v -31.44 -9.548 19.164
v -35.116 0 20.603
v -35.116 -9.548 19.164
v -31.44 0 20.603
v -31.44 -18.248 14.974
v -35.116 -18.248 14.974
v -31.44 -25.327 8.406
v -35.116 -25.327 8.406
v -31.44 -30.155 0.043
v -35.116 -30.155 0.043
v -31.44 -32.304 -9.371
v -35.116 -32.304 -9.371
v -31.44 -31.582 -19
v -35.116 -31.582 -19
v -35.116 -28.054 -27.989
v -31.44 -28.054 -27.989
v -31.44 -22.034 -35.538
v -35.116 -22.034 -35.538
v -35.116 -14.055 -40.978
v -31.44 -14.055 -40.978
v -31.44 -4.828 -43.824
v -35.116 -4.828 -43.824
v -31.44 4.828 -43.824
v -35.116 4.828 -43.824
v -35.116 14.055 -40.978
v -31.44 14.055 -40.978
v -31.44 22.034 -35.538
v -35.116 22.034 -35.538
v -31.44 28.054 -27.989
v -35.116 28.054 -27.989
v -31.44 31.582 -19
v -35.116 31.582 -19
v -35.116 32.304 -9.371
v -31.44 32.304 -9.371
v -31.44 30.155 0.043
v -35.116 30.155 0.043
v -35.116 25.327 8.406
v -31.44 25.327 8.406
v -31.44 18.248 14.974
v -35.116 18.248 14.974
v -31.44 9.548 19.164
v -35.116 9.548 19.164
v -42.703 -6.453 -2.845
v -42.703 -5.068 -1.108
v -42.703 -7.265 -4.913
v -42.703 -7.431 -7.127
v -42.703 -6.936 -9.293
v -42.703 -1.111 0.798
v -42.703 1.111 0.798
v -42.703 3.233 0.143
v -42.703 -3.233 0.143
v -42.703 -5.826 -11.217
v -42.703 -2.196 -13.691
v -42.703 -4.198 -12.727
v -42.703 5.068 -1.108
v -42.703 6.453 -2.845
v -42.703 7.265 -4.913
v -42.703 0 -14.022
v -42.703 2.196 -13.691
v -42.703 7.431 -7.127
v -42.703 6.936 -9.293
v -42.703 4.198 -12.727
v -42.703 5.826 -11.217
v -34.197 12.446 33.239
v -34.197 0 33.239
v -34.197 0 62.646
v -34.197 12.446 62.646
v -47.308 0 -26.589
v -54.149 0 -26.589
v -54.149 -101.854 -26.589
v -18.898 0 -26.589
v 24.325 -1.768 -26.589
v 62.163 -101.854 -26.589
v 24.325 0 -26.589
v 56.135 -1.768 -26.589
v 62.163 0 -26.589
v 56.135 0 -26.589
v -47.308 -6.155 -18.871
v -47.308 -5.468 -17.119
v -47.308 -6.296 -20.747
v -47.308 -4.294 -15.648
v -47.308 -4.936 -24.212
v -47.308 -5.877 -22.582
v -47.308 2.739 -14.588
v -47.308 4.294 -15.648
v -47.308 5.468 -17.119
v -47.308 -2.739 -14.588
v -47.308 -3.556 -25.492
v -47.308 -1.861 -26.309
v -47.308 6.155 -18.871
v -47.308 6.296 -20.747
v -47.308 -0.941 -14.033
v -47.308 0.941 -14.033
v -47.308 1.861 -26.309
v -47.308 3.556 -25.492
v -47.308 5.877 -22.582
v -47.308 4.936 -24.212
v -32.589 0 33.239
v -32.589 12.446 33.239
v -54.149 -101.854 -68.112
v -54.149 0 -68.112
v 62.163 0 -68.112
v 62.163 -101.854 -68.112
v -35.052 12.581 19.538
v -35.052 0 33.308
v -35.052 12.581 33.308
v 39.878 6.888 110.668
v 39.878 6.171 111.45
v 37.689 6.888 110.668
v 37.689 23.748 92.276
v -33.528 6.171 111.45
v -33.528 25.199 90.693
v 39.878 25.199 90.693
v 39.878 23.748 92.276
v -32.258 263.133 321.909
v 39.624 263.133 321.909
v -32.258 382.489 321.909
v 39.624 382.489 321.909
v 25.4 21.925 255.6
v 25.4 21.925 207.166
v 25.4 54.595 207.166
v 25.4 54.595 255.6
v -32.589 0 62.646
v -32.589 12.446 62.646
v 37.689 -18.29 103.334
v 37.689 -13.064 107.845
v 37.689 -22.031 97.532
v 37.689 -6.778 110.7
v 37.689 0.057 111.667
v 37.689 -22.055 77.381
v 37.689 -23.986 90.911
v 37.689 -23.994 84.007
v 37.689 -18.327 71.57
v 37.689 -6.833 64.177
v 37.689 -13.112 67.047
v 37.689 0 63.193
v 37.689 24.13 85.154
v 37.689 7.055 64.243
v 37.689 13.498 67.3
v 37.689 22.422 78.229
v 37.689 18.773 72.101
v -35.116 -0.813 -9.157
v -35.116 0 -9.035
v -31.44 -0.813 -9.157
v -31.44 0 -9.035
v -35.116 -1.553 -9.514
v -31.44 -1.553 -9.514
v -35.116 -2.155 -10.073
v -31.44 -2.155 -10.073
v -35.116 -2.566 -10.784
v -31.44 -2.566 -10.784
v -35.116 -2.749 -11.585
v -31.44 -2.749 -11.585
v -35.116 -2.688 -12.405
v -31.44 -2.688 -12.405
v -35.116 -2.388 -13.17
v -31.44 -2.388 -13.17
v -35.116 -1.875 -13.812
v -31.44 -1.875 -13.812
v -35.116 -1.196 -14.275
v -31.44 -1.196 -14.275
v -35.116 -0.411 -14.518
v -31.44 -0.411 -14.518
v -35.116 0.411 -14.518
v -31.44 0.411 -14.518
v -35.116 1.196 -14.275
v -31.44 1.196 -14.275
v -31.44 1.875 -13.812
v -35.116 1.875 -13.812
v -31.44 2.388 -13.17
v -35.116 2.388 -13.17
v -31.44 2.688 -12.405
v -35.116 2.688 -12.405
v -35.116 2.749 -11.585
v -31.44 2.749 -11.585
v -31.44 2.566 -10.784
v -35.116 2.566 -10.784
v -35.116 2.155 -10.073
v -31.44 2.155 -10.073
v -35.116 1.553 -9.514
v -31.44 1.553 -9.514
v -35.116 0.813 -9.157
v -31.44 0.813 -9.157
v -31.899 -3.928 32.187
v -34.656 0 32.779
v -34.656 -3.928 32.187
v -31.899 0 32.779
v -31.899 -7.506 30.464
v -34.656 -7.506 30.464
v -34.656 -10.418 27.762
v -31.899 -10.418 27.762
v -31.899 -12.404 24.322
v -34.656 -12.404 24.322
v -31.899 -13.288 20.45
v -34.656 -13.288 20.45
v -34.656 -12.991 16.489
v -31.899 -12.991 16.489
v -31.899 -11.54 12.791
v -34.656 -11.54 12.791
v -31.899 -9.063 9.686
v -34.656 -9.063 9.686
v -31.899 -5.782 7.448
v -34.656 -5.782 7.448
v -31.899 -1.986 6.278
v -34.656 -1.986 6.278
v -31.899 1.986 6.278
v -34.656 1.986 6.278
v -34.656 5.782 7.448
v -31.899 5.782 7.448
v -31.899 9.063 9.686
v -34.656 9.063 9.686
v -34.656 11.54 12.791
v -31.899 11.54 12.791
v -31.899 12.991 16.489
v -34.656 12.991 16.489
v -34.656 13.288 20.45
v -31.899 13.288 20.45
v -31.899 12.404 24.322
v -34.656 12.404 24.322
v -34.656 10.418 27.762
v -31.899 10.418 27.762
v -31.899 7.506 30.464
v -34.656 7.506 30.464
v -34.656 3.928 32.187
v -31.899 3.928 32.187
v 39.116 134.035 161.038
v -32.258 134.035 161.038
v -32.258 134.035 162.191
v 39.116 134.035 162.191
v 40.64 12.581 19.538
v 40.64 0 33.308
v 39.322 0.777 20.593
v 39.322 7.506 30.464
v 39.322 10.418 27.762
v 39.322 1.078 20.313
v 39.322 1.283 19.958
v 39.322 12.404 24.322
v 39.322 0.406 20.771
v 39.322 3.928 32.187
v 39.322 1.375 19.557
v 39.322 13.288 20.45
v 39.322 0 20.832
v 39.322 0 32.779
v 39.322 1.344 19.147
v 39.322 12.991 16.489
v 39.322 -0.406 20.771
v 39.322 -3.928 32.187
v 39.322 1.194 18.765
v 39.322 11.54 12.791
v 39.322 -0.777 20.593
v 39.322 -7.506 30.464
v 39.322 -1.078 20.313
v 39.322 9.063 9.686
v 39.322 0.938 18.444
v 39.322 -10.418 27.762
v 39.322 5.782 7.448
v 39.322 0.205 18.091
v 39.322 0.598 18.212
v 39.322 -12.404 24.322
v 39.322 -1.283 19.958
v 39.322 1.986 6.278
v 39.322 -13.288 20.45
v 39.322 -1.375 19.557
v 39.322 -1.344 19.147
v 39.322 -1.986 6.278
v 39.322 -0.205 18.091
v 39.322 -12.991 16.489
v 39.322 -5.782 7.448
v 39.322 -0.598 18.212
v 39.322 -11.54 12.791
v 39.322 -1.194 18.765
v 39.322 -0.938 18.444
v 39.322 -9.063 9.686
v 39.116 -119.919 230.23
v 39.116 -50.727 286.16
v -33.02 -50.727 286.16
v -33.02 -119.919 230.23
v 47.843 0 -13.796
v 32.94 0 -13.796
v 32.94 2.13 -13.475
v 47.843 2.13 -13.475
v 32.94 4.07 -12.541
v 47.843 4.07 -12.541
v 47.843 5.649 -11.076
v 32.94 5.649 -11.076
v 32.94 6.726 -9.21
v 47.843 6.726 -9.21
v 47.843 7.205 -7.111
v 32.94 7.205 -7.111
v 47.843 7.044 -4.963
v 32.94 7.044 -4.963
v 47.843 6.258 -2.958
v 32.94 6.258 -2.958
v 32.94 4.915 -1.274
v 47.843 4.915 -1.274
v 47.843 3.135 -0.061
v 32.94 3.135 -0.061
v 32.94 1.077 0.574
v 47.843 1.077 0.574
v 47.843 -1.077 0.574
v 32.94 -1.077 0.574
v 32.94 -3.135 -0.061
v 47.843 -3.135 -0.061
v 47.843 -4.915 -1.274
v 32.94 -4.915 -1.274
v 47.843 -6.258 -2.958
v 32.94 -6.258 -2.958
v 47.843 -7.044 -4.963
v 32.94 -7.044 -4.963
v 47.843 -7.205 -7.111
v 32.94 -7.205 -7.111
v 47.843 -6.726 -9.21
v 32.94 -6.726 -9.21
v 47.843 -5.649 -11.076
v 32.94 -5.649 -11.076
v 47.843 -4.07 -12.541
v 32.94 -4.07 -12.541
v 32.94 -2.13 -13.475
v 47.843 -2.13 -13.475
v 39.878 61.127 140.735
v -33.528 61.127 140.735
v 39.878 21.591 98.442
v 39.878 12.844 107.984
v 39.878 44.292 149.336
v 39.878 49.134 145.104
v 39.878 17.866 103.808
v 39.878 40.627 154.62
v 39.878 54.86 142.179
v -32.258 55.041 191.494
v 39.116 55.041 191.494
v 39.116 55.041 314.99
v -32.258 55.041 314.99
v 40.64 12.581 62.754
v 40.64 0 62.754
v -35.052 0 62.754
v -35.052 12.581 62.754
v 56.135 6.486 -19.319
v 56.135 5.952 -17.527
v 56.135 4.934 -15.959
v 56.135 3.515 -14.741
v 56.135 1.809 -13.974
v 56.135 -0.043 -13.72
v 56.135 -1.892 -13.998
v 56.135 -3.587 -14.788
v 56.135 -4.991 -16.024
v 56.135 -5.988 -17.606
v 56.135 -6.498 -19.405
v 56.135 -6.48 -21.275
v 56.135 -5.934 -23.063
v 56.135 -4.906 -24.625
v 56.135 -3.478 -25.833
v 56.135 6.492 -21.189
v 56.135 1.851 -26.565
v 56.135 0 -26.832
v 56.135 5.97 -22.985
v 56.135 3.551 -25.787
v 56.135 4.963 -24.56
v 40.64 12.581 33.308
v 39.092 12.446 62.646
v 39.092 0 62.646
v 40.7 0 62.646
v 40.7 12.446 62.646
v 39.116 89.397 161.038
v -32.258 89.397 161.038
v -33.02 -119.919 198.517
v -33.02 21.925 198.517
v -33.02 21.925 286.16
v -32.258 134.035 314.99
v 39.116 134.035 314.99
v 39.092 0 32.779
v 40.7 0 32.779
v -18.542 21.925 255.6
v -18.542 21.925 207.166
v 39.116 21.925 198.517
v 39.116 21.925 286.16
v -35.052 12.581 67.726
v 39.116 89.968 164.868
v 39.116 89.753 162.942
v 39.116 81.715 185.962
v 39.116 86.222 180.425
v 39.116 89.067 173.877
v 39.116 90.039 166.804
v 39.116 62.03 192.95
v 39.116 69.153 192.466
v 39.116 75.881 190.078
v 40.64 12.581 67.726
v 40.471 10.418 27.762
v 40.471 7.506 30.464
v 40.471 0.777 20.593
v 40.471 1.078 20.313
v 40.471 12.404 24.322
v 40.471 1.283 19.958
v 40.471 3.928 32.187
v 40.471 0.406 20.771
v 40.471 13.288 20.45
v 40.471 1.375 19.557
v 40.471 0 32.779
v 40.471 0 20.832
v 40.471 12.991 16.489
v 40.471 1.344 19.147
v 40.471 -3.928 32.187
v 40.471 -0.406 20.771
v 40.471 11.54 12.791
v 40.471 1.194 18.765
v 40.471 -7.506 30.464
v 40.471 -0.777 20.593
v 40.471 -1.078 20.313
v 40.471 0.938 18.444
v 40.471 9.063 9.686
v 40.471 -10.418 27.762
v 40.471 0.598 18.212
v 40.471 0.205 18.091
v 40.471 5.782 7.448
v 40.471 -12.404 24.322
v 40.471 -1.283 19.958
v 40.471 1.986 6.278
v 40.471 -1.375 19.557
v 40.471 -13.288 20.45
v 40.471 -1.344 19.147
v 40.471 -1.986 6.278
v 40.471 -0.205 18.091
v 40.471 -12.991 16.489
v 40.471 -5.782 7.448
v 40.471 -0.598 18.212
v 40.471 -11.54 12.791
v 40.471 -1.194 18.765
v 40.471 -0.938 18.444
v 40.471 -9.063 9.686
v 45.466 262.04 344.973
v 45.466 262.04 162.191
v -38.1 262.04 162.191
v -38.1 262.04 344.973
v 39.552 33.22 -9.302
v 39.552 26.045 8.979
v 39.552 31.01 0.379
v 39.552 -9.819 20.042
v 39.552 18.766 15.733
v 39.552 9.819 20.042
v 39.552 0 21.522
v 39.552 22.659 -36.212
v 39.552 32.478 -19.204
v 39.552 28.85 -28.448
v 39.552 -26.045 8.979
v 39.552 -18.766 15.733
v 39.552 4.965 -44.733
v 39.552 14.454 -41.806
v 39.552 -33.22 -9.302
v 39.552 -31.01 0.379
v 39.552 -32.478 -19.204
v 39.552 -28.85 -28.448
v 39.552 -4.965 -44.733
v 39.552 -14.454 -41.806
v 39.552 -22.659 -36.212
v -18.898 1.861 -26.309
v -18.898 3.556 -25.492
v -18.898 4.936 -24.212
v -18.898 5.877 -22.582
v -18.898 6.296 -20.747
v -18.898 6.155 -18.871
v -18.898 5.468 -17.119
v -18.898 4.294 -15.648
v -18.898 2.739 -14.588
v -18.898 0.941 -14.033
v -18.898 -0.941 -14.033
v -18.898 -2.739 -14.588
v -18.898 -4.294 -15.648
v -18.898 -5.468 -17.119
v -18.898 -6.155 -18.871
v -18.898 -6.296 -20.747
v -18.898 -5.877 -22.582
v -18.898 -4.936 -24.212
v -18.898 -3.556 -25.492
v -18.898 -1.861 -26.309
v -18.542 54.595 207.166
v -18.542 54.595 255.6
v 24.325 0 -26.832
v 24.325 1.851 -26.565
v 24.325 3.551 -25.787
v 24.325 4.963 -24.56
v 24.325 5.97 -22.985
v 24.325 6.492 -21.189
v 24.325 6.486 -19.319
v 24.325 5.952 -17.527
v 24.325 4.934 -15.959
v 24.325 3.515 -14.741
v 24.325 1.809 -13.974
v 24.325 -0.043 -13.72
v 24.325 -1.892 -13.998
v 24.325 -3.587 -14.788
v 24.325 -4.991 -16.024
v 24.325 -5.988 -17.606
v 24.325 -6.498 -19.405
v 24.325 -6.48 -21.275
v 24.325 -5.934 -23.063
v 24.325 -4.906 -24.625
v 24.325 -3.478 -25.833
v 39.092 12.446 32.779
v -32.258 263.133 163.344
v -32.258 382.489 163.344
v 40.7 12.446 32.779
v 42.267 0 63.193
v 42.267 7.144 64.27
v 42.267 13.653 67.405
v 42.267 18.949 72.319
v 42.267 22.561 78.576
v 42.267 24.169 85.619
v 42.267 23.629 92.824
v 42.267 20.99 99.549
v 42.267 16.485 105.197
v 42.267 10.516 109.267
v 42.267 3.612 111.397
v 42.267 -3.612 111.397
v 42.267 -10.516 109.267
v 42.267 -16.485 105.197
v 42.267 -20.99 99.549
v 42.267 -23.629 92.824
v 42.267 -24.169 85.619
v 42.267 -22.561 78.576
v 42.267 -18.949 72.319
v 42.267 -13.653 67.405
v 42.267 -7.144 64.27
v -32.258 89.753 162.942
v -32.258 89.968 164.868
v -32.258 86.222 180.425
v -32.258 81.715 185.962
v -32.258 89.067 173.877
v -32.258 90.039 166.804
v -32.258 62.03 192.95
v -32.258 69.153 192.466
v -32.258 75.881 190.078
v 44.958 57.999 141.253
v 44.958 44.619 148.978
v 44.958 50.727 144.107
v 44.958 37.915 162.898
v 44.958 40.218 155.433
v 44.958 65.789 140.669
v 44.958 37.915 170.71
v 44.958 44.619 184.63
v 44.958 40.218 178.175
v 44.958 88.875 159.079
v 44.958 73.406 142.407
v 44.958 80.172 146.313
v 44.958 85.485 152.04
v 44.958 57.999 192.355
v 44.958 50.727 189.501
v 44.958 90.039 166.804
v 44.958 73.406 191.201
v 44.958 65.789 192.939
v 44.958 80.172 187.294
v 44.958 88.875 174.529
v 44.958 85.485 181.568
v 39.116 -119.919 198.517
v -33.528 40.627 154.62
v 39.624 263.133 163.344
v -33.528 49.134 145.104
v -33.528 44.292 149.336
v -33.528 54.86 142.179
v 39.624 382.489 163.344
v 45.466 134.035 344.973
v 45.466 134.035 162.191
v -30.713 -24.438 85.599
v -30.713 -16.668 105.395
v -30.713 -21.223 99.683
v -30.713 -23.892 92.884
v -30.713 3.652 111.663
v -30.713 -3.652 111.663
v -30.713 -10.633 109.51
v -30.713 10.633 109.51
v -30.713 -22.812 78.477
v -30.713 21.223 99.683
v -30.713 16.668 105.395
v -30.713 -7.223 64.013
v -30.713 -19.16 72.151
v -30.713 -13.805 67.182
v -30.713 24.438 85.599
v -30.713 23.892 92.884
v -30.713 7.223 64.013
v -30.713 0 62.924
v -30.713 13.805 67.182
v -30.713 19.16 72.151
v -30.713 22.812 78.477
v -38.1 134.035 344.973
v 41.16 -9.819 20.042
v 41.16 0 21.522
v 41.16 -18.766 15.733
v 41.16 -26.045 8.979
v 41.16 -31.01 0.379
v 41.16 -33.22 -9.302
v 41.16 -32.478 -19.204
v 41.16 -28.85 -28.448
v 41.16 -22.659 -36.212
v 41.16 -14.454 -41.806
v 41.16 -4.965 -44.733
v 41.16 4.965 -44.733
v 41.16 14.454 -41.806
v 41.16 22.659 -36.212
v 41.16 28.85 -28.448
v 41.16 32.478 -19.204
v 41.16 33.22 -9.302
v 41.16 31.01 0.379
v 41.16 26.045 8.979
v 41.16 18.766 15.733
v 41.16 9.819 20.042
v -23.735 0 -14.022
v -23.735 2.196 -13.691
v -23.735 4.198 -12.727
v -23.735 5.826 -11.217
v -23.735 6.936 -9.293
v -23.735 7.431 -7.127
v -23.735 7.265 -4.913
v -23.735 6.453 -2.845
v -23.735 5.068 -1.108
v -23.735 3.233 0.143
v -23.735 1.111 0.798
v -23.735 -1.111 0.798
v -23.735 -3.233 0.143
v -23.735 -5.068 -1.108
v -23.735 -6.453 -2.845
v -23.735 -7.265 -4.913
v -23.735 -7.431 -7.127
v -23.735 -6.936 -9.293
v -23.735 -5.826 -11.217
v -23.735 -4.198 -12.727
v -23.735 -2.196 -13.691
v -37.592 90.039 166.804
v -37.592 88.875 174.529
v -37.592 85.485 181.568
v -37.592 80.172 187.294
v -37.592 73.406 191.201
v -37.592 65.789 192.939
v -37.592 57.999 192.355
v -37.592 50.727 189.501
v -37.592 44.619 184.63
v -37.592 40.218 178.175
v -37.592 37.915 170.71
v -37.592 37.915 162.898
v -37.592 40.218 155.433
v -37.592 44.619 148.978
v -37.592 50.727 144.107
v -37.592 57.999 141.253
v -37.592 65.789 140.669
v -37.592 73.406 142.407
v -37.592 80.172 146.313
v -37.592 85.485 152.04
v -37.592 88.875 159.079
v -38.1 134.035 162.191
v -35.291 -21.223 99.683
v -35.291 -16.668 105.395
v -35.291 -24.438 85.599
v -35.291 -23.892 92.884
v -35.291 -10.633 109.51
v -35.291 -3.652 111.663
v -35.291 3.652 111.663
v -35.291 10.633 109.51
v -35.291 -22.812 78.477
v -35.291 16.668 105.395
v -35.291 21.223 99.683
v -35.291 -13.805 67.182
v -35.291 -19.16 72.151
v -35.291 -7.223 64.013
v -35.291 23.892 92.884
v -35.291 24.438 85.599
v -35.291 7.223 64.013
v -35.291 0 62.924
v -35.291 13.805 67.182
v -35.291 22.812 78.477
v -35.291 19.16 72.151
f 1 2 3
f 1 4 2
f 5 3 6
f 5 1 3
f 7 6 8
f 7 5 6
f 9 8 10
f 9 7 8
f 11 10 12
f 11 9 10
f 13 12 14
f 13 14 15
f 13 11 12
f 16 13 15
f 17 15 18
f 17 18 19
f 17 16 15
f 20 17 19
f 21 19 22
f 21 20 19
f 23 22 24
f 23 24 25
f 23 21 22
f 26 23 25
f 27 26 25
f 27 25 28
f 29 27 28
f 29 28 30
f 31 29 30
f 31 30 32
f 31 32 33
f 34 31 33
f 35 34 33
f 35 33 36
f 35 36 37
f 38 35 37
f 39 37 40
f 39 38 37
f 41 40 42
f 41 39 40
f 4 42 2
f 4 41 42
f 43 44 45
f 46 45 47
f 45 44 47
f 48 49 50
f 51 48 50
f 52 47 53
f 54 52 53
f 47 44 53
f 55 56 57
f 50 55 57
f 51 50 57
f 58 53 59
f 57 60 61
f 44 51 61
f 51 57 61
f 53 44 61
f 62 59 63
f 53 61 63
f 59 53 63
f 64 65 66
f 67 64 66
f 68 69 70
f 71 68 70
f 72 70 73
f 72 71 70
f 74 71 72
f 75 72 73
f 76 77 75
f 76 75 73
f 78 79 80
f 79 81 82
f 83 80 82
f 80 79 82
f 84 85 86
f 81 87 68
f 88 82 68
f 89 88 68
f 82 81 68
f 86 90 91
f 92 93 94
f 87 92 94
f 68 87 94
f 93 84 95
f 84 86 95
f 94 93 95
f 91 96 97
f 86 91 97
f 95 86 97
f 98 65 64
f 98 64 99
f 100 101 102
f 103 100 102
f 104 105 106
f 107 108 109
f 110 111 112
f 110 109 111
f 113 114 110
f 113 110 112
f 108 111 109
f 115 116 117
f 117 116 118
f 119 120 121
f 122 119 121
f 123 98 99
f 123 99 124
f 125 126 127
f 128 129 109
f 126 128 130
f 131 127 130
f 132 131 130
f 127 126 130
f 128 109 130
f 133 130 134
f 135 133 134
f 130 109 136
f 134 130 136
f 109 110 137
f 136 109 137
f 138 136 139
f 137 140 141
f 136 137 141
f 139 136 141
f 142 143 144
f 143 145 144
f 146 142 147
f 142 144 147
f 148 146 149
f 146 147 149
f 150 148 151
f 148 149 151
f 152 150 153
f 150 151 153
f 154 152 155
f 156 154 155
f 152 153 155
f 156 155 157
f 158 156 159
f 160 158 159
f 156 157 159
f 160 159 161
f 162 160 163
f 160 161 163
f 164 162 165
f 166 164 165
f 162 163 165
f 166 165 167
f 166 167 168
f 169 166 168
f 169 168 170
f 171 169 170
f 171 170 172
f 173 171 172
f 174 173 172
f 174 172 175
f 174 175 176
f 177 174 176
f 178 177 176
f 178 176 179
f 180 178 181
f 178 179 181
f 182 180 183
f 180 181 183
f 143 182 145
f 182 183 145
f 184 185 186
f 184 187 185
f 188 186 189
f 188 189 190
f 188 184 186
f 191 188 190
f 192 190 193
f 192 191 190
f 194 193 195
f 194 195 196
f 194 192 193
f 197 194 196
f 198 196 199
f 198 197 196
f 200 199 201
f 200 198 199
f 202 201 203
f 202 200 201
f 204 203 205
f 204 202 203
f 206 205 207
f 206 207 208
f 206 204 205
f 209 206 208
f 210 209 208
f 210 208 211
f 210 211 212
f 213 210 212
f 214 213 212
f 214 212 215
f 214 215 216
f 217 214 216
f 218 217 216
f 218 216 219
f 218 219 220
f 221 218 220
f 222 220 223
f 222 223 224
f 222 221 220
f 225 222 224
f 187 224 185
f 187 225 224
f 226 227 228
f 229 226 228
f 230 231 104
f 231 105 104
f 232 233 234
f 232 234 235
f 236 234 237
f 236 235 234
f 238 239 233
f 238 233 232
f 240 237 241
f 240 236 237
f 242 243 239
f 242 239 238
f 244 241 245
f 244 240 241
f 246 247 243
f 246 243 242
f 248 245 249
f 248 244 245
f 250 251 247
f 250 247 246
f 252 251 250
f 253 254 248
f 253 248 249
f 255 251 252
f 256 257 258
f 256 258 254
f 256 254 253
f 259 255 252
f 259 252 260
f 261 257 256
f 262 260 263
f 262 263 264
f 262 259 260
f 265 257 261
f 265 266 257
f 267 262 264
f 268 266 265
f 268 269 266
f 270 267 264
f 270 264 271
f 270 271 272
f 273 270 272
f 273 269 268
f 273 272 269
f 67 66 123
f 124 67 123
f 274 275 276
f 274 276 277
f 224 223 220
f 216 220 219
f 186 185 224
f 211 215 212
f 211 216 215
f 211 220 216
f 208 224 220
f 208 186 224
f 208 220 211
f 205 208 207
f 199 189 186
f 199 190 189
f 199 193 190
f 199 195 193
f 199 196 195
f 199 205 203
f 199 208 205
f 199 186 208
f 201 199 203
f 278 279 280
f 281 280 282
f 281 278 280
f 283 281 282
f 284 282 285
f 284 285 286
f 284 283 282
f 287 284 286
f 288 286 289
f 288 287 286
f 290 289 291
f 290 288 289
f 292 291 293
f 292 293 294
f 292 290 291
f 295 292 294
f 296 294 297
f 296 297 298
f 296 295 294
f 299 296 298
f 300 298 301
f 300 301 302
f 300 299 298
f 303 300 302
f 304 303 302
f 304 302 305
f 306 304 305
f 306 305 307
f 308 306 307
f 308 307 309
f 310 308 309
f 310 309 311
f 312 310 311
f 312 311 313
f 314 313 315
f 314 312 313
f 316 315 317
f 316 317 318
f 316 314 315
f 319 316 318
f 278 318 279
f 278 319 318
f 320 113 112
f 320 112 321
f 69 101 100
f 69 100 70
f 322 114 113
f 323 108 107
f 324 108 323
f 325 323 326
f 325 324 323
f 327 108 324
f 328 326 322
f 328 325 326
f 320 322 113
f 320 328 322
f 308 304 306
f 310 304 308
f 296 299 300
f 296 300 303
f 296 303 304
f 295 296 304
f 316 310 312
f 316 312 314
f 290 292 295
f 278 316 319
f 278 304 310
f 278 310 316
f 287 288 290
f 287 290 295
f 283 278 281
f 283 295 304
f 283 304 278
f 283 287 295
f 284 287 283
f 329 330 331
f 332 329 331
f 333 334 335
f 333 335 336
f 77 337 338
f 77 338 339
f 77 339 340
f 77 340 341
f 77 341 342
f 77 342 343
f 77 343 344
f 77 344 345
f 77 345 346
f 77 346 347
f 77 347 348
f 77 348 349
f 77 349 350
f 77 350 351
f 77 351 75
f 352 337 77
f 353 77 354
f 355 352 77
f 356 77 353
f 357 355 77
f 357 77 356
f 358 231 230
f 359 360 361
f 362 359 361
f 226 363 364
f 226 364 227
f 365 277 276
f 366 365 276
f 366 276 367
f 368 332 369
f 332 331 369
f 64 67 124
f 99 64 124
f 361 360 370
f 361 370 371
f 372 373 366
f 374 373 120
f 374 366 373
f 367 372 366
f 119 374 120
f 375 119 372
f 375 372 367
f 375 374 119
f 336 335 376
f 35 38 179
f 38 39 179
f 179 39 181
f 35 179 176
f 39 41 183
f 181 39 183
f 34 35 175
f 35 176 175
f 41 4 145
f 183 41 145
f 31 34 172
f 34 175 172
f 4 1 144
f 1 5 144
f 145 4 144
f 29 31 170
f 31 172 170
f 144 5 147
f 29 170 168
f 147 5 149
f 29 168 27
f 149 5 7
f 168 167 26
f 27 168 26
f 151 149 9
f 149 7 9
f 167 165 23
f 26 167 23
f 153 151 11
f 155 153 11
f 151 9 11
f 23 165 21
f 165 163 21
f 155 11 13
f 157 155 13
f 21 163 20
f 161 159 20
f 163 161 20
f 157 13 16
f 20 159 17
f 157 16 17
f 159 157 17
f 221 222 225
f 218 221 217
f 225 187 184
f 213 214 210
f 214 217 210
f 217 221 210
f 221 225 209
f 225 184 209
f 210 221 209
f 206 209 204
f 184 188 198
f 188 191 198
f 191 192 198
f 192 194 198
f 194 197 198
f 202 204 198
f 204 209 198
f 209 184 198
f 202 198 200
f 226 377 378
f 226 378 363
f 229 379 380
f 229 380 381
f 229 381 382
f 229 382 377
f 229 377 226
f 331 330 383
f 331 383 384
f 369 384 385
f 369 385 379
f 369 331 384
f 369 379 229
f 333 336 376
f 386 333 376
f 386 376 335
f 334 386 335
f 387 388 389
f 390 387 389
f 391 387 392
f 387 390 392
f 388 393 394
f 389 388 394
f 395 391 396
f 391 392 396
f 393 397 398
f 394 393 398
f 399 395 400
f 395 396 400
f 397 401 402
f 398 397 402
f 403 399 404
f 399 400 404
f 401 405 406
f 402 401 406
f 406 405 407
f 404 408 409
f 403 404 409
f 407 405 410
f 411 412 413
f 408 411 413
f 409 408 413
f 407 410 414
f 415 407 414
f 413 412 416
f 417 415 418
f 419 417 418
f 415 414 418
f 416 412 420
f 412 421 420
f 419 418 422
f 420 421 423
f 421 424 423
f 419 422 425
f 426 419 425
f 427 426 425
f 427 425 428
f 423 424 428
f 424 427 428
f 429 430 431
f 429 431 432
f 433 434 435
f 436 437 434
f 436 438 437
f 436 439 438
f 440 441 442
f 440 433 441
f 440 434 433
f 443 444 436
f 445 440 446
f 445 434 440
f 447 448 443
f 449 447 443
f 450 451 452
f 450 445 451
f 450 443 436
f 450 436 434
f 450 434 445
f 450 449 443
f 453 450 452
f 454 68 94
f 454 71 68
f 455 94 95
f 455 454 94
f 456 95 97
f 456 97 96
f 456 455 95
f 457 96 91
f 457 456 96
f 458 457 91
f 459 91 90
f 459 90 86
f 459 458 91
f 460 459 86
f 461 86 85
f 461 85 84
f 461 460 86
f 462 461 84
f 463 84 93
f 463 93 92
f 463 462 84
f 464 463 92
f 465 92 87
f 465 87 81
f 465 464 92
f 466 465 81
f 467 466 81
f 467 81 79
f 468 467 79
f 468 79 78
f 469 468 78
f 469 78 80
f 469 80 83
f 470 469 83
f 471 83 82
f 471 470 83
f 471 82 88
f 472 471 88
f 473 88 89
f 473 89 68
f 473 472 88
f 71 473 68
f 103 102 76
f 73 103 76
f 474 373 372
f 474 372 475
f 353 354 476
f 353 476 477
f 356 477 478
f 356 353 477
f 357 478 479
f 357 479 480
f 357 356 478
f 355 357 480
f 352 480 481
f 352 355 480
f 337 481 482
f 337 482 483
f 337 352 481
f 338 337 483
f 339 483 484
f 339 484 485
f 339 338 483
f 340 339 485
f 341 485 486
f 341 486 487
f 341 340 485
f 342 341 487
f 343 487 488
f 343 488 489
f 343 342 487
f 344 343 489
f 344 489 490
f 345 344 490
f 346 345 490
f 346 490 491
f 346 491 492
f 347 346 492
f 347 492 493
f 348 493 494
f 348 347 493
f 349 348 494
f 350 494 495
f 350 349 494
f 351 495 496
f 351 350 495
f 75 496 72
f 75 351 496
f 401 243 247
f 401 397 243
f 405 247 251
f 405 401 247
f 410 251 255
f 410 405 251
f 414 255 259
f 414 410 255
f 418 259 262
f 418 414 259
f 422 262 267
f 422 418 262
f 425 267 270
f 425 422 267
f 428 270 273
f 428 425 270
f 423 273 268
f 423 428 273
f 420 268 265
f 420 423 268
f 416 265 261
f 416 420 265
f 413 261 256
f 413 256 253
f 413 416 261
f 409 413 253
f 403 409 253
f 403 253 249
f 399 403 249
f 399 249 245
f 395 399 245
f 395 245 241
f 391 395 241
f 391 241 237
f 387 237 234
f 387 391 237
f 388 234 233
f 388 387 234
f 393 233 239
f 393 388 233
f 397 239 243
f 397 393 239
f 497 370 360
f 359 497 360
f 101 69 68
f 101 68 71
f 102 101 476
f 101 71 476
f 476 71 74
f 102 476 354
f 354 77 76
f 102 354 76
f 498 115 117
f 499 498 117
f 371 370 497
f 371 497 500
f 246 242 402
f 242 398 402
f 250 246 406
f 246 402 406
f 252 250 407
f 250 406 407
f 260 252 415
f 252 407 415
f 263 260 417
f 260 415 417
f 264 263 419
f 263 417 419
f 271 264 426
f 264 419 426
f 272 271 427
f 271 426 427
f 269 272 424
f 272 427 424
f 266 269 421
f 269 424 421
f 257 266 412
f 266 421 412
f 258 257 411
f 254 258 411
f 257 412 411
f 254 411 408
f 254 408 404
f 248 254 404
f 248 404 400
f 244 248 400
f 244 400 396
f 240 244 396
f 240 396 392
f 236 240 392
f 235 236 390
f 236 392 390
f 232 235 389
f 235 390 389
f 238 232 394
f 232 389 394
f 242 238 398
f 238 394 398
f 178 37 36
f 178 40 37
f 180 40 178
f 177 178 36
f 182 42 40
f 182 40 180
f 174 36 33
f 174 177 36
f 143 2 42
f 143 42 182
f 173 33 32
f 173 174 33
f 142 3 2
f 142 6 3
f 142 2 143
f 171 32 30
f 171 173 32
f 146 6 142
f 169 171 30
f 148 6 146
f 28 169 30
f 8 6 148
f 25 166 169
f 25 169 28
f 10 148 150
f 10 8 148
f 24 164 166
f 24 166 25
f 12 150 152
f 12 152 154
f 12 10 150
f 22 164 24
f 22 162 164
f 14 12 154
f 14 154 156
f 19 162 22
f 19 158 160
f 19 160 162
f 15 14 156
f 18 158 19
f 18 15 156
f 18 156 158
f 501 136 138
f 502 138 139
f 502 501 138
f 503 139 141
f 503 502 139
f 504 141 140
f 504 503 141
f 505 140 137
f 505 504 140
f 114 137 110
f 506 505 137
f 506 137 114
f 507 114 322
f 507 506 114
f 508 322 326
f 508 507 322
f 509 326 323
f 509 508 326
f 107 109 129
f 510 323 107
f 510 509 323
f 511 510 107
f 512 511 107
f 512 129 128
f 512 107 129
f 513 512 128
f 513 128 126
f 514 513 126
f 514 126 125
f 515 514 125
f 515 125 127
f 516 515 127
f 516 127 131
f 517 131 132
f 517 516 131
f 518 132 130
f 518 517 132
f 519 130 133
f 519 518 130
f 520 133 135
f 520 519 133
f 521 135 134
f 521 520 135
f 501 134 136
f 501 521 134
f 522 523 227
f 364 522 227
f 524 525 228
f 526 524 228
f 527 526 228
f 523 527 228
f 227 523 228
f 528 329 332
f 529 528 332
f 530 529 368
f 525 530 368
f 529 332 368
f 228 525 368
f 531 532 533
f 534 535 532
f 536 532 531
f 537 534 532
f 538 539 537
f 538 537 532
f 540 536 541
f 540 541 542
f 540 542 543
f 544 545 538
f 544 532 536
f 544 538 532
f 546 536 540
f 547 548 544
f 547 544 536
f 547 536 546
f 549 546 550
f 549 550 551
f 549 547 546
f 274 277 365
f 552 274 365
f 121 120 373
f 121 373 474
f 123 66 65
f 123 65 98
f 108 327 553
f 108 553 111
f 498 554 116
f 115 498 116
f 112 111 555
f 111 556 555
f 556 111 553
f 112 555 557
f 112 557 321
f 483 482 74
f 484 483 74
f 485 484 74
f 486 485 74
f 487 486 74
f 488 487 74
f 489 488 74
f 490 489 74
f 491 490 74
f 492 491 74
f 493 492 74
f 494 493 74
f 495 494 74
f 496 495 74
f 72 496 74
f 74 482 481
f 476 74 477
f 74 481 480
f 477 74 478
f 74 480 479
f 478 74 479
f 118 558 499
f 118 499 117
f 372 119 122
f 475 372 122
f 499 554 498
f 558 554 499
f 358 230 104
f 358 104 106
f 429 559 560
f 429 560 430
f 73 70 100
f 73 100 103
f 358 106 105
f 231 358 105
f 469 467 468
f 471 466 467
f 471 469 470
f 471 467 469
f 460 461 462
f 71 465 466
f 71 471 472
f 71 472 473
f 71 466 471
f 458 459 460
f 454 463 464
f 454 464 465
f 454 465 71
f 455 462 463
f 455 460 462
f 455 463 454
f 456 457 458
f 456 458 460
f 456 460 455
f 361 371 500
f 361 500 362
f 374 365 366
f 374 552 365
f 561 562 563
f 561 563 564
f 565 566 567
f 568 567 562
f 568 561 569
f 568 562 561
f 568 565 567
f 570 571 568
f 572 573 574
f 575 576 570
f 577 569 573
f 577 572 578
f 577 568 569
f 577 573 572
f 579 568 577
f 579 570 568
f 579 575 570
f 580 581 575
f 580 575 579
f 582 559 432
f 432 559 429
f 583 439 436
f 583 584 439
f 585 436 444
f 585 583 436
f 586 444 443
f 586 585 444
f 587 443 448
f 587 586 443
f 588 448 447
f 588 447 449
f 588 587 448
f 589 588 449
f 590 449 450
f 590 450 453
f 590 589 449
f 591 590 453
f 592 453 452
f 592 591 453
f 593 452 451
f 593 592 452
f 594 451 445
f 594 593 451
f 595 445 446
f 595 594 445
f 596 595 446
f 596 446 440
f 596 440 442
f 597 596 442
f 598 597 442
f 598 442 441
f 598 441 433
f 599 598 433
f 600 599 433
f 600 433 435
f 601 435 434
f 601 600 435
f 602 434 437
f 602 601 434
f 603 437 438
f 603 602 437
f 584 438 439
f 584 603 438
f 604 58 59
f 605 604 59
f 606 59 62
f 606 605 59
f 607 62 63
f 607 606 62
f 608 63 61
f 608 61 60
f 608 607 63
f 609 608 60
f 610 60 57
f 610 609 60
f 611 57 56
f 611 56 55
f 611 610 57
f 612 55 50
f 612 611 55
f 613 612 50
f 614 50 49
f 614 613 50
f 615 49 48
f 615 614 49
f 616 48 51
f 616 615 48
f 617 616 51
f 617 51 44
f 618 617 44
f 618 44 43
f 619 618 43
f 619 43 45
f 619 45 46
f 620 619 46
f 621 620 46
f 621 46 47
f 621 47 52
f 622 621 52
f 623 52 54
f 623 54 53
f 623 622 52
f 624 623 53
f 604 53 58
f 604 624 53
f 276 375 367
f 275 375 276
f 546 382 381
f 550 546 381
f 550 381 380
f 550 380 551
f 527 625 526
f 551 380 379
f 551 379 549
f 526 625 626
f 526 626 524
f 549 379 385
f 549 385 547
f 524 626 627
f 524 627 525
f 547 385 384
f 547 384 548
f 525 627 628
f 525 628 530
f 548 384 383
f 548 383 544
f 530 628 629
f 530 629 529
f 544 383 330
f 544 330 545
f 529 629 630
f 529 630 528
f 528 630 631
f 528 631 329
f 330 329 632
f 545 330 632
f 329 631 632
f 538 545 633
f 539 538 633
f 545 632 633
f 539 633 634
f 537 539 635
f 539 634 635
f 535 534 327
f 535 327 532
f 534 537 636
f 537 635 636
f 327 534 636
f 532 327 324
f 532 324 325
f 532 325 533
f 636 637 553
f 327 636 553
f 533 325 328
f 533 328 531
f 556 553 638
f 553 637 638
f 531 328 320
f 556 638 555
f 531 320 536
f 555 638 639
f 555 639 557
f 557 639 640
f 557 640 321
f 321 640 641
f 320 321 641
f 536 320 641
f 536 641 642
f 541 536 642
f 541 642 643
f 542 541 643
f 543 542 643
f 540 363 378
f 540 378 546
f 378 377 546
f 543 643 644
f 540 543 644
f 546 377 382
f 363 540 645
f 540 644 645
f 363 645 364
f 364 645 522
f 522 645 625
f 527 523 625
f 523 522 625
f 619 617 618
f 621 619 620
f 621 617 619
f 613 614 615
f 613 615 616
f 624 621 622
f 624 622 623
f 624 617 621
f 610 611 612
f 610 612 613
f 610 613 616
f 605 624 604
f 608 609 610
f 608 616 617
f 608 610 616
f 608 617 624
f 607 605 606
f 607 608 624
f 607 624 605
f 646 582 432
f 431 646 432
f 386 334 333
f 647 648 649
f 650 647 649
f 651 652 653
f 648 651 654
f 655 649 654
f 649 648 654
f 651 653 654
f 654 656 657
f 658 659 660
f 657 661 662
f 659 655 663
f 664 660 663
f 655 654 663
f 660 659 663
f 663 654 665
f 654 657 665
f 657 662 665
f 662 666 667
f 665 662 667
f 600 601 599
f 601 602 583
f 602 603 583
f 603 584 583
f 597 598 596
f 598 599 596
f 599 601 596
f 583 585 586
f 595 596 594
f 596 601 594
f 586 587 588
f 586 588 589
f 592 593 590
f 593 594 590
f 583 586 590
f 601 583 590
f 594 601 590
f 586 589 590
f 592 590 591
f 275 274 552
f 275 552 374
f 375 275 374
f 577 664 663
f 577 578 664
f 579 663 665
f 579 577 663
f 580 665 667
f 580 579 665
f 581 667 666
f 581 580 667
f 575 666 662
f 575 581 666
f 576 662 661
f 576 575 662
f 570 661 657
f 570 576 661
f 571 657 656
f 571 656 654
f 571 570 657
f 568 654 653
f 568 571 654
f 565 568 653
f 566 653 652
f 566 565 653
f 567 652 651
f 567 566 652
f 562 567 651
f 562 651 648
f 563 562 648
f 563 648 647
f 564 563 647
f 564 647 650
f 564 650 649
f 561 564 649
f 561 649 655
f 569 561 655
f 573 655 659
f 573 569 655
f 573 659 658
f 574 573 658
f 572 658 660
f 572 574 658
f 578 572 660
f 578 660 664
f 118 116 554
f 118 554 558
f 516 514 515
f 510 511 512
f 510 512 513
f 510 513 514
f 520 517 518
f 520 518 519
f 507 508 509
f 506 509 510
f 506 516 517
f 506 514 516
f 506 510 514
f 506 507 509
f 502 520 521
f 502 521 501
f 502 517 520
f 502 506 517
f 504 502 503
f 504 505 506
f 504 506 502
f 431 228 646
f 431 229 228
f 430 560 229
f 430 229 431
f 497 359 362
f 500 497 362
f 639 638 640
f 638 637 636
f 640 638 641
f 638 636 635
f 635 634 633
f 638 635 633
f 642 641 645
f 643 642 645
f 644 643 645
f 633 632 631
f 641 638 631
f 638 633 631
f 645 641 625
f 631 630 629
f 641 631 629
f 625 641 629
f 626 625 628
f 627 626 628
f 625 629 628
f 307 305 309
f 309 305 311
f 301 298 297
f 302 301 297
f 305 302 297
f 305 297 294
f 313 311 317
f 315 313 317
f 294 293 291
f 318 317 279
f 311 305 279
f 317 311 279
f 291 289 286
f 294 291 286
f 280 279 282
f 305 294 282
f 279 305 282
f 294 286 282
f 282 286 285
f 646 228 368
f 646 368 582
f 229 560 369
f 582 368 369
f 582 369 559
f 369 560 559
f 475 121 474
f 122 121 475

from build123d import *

# Parameters (mm, degrees)
F0_W           = 116.3119599223
F0_H           = 41.522635147
F1_DEPTH       = 101.854
F2_W           = 31.8097397685
F2_H           = 6.5562054515
F2_W_2         = 28.4102298319
F2_H_2         = 6.3133835793
F4_W           = 18.9671367407
F4_H           = 7.4513759464
F4_W_2         = 14.9027481675
F4_H_2         = 7.2255767882
F6_W           = 3.6759376526
F6_H           = 29.6372557059
F6_W_2         = 1.608222723
F6_H_2         = 33.3131942898
F8_W           = 2.7569532394
F8_H           = 13.3252739906
F8_W_2         = 1.1487305164
F8_H_2         = 11.946797371
F10_W          = 1.608222723
F10_H          = 29.4075123966
F11_DEPTH      = 12.446
F10_H_2        = 29.8670083284
F12_W          = 4.578076303
F12_H          = 24.5061889291
F12_W_2        = 4.5780874789
F12_H_2        = 24.2368876934
F15_DEPTH      = 35.052
F15_DEPTH_BACK = 40.64
F17_DEPTH      = 39.878
F17_DEPTH_BACK = 33.528
F18_R          = 26.2083289981
F19_DEPTH      = 44.958
F19_DEPTH_BACK = 37.592
F20_W          = 78.9941027761
F20_H          = 153.9520323277
F21_DEPTH      = 39.116
F21_DEPTH_BACK = 32.258
F22_W          = 128.0050724745
F22_H          = 182.7819943428
F23_DEPTH      = 45.466
F23_DEPTH_BACK = 38.1
F24_W          = 119.3560659885
F24_H          = 158.5648357868
F25_DEPTH      = 39.624
F25_DEPTH_BACK = 32.258
F26_W          = 33.4427561611
F26_H          = 48.4343320131
F27_DEPTH      = 25.4
F27_DEPTH_BACK = 18.542
F29_DEPTH      = 39.116
F29_DEPTH_BACK = 33.02


with BuildPart() as f1:
    # F0 (on Front) → F1 (new body)
    with BuildSketch(Plane.XZ):
        with Locations((4.0065683424, -47.3503777757)):
            Rectangle(F0_W, F0_H)
    extrude(amount=F1_DEPTH)

    # F2 (on Front) → F3 (revolve)
    with BuildSketch(Plane.XZ):
        with Locations((40.2297079563, -23.5537793487)):
            Rectangle(F2_W, F2_H)
        with Locations((-33.1026744097, -23.4323684126)):
            Rectangle(F2_W_2, F2_H_2)
    revolve(axis=Axis((-33.1026744097, 0, -20.275676623), (1, 0, 0)))


with BuildPart() as f5:
    # F4 (on Front) → F5 (revolve)
    with BuildSketch(Plane.XZ):
        with Locations((-33.2190059125, -10.2963354439)):
            Rectangle(F4_W, F4_H)
    revolve(axis=Axis((-33.2190059125, 0, -6.5706474707), (1, 0, 0)))


with BuildPart() as f5b:
    # F4 (on Front) → F5, piece 2 (revolve)
    with BuildSketch(Plane.XZ):
        with Locations((40.3915531933, -10.1834358647)):
            Rectangle(F4_W_2, F4_H_2)
    revolve(axis=Axis((-33.2190059125, 0, -6.5706474707), (1, 0, 0)))


with BuildPart() as f7:
    # F6 (on Front) → F7 (revolve)
    with BuildSketch(Plane.XZ):
        with Locations((-33.2778468728, 5.7841050439)):
            Rectangle(F6_W, F6_H)
    revolve(axis=Axis((40.355797857, 0, -11.7914769799), (1, 0, 0)))


with BuildPart() as f7b:
    # F6 (on Front) → F7, piece 2 (revolve)
    with BuildSketch(Plane.XZ):
        with Locations((40.355797857, 4.8651201651)):
            Rectangle(F6_W_2, F6_H_2)
    revolve(axis=Axis((40.355797857, 0, -11.7914769799), (1, 0, 0)))


with BuildPart() as f9:
    # F8 (on Front) → F9 (revolve)
    with BuildSketch(Plane.XZ):
        with Locations((-33.2778468728, 26.1166393757)):
            Rectangle(F8_W, F8_H)
    revolve(axis=Axis((-33.2778468728, 0, 19.4540023804), (1, 0, 0)))


with BuildPart() as f9b:
    # F8 (on Front) → F9, piece 2 (revolve)
    with BuildSketch(Plane.XZ):
        with Locations((39.8963056505, 26.8058776855)):
            Rectangle(F8_W_2, F8_H_2)
    revolve(axis=Axis((-33.2778468728, 0, 19.4540023804), (1, 0, 0)))


with BuildPart() as f11:
    # F10 (on Front) → F11 (new body)
    with BuildSketch(Plane.XZ):
        with Locations((-33.3927199244, 47.9425285012)):
            Rectangle(F10_W, F10_H)
    extrude(amount=-F11_DEPTH)


with BuildPart() as f11b:
    # F10 (on Front) → F11, piece 2 (new body)
    with BuildSketch(Plane.XZ):
        with Locations((39.8963056505, 47.7127805352)):
            Rectangle(F10_W, F10_H_2)
    extrude(amount=-F11_DEPTH)


with BuildPart() as f13:
    # F12 (on Front) → F13 (revolve)
    with BuildSketch(Plane.XZ):
        with Locations((-33.0021753907, 75.1772858202)):
            Rectangle(F12_W, F12_H)
    revolve(axis=Axis((-33.0021753907, 0, 87.4303802848), (1, 0, 0)))


with BuildPart() as f13b:
    # F12 (on Front) → F13, piece 2 (revolve)
    with BuildSketch(Plane.XZ):
        with Locations((39.9777796119, 75.3119364381)):
            Rectangle(F12_W_2, F12_H_2)
    revolve(axis=Axis((-33.0021753907, 0, 87.4303802848), (1, 0, 0)))

    # F16 (on Right) → F17 (join, two sides)
    with BuildSketch(Plane.YZ) as f17_sk:
        Polygon((56.3351027668, 174.2997467518), (6.1709606089, 111.4504113793), (25.198739022, 90.692833066), (73.6330896616, 158.154964447), align=None)
    extrude(amount=F17_DEPTH)
    extrude(f17_sk.sketch, amount=-F17_DEPTH_BACK)

    # F18 (on Right) → F19 (join, two sides)
    with BuildSketch(Plane.YZ) as f19_sk:
        with Locations((63.830897212, 166.8039560318)):
            Circle(F18_R)
    extrude(amount=F19_DEPTH)
    extrude(f19_sk.sketch, amount=-F19_DEPTH_BACK)

    # F20 (on Right) → F21 (join, two sides)
    with BuildSketch(Plane.YZ) as f21_sk:
        with Locations((94.5375673473, 238.0139678717)):
            Rectangle(F20_W, F20_H)
    extrude(amount=F21_DEPTH)
    extrude(f21_sk.sketch, amount=-F21_DEPTH_BACK)

    # F22 (on Right) → F23 (join, two sides)
    with BuildSketch(Plane.YZ) as f23_sk:
        with Locations((198.0371549726, 253.582149744)):
            Rectangle(F22_W, F22_H)
    extrude(amount=F23_DEPTH)
    extrude(f23_sk.sketch, amount=-F23_DEPTH_BACK)


with BuildPart() as f15:
    # F14 (on Right) → F15 (new body, two sides)
    with BuildSketch(Plane.YZ) as f15_sk:
        Polygon((12.5808566809, 33.3080738783), (0, 33.3080738783), (12.5808566809, 19.538397619), align=None)
    extrude(amount=-F15_DEPTH)
    extrude(f15_sk.sketch, amount=F15_DEPTH_BACK)


with BuildPart() as f15b:
    # F14 (on Right) → F15, piece 2 (new body, two sides)
    with BuildSketch(Plane.YZ) as f15_2_sk:
        Polygon((12.5808566809, 67.7258933343), (0, 62.7542436123), (12.5808566809, 62.7542436123), align=None)
    extrude(amount=-F15_DEPTH)
    extrude(f15_2_sk.sketch, amount=F15_DEPTH_BACK)


with BuildPart() as f25:
    # F24 (on Right) → F25 (new body, two sides)
    with BuildSketch(Plane.YZ) as f25_sk:
        with Locations((322.8114396334, 242.6267713308)):
            Rectangle(F24_W, F24_H)
    extrude(amount=F25_DEPTH)
    extrude(f25_sk.sketch, amount=-F25_DEPTH_BACK)


with BuildPart() as f27:
    # F26 (on Right) → F27 (new body, two sides)
    with BuildSketch(Plane.YZ) as f27_sk:
        with Locations((37.8732094541, 231.3830778003)):
            Rectangle(F26_W, F26_H)
    extrude(amount=F27_DEPTH)
    extrude(f27_sk.sketch, amount=-F27_DEPTH_BACK)

    # F28 (on Right) → F29 (join, two sides)
    with BuildSketch(Plane.YZ) as f29_sk:
        Polygon((21.9247117639, 198.5169202089), (21.9247117639, 255.6002438068), (21.9247117639, 286.1600220203), (-50.7268160582, 286.1600220203), (-119.9187487364, 230.2298843861), (-119.9187487364, 198.5169202089), align=None)
    extrude(amount=F29_DEPTH)
    extrude(f29_sk.sketch, amount=-F29_DEPTH_BACK)


solid = Compound([f1.part, f5.part, f5b.part, f7.part, f7b.part, f9.part, f9b.part, f11.part, f11b.part, f13.part, f13b.part, f15.part, f15b.part, f25.part, f27.part])
